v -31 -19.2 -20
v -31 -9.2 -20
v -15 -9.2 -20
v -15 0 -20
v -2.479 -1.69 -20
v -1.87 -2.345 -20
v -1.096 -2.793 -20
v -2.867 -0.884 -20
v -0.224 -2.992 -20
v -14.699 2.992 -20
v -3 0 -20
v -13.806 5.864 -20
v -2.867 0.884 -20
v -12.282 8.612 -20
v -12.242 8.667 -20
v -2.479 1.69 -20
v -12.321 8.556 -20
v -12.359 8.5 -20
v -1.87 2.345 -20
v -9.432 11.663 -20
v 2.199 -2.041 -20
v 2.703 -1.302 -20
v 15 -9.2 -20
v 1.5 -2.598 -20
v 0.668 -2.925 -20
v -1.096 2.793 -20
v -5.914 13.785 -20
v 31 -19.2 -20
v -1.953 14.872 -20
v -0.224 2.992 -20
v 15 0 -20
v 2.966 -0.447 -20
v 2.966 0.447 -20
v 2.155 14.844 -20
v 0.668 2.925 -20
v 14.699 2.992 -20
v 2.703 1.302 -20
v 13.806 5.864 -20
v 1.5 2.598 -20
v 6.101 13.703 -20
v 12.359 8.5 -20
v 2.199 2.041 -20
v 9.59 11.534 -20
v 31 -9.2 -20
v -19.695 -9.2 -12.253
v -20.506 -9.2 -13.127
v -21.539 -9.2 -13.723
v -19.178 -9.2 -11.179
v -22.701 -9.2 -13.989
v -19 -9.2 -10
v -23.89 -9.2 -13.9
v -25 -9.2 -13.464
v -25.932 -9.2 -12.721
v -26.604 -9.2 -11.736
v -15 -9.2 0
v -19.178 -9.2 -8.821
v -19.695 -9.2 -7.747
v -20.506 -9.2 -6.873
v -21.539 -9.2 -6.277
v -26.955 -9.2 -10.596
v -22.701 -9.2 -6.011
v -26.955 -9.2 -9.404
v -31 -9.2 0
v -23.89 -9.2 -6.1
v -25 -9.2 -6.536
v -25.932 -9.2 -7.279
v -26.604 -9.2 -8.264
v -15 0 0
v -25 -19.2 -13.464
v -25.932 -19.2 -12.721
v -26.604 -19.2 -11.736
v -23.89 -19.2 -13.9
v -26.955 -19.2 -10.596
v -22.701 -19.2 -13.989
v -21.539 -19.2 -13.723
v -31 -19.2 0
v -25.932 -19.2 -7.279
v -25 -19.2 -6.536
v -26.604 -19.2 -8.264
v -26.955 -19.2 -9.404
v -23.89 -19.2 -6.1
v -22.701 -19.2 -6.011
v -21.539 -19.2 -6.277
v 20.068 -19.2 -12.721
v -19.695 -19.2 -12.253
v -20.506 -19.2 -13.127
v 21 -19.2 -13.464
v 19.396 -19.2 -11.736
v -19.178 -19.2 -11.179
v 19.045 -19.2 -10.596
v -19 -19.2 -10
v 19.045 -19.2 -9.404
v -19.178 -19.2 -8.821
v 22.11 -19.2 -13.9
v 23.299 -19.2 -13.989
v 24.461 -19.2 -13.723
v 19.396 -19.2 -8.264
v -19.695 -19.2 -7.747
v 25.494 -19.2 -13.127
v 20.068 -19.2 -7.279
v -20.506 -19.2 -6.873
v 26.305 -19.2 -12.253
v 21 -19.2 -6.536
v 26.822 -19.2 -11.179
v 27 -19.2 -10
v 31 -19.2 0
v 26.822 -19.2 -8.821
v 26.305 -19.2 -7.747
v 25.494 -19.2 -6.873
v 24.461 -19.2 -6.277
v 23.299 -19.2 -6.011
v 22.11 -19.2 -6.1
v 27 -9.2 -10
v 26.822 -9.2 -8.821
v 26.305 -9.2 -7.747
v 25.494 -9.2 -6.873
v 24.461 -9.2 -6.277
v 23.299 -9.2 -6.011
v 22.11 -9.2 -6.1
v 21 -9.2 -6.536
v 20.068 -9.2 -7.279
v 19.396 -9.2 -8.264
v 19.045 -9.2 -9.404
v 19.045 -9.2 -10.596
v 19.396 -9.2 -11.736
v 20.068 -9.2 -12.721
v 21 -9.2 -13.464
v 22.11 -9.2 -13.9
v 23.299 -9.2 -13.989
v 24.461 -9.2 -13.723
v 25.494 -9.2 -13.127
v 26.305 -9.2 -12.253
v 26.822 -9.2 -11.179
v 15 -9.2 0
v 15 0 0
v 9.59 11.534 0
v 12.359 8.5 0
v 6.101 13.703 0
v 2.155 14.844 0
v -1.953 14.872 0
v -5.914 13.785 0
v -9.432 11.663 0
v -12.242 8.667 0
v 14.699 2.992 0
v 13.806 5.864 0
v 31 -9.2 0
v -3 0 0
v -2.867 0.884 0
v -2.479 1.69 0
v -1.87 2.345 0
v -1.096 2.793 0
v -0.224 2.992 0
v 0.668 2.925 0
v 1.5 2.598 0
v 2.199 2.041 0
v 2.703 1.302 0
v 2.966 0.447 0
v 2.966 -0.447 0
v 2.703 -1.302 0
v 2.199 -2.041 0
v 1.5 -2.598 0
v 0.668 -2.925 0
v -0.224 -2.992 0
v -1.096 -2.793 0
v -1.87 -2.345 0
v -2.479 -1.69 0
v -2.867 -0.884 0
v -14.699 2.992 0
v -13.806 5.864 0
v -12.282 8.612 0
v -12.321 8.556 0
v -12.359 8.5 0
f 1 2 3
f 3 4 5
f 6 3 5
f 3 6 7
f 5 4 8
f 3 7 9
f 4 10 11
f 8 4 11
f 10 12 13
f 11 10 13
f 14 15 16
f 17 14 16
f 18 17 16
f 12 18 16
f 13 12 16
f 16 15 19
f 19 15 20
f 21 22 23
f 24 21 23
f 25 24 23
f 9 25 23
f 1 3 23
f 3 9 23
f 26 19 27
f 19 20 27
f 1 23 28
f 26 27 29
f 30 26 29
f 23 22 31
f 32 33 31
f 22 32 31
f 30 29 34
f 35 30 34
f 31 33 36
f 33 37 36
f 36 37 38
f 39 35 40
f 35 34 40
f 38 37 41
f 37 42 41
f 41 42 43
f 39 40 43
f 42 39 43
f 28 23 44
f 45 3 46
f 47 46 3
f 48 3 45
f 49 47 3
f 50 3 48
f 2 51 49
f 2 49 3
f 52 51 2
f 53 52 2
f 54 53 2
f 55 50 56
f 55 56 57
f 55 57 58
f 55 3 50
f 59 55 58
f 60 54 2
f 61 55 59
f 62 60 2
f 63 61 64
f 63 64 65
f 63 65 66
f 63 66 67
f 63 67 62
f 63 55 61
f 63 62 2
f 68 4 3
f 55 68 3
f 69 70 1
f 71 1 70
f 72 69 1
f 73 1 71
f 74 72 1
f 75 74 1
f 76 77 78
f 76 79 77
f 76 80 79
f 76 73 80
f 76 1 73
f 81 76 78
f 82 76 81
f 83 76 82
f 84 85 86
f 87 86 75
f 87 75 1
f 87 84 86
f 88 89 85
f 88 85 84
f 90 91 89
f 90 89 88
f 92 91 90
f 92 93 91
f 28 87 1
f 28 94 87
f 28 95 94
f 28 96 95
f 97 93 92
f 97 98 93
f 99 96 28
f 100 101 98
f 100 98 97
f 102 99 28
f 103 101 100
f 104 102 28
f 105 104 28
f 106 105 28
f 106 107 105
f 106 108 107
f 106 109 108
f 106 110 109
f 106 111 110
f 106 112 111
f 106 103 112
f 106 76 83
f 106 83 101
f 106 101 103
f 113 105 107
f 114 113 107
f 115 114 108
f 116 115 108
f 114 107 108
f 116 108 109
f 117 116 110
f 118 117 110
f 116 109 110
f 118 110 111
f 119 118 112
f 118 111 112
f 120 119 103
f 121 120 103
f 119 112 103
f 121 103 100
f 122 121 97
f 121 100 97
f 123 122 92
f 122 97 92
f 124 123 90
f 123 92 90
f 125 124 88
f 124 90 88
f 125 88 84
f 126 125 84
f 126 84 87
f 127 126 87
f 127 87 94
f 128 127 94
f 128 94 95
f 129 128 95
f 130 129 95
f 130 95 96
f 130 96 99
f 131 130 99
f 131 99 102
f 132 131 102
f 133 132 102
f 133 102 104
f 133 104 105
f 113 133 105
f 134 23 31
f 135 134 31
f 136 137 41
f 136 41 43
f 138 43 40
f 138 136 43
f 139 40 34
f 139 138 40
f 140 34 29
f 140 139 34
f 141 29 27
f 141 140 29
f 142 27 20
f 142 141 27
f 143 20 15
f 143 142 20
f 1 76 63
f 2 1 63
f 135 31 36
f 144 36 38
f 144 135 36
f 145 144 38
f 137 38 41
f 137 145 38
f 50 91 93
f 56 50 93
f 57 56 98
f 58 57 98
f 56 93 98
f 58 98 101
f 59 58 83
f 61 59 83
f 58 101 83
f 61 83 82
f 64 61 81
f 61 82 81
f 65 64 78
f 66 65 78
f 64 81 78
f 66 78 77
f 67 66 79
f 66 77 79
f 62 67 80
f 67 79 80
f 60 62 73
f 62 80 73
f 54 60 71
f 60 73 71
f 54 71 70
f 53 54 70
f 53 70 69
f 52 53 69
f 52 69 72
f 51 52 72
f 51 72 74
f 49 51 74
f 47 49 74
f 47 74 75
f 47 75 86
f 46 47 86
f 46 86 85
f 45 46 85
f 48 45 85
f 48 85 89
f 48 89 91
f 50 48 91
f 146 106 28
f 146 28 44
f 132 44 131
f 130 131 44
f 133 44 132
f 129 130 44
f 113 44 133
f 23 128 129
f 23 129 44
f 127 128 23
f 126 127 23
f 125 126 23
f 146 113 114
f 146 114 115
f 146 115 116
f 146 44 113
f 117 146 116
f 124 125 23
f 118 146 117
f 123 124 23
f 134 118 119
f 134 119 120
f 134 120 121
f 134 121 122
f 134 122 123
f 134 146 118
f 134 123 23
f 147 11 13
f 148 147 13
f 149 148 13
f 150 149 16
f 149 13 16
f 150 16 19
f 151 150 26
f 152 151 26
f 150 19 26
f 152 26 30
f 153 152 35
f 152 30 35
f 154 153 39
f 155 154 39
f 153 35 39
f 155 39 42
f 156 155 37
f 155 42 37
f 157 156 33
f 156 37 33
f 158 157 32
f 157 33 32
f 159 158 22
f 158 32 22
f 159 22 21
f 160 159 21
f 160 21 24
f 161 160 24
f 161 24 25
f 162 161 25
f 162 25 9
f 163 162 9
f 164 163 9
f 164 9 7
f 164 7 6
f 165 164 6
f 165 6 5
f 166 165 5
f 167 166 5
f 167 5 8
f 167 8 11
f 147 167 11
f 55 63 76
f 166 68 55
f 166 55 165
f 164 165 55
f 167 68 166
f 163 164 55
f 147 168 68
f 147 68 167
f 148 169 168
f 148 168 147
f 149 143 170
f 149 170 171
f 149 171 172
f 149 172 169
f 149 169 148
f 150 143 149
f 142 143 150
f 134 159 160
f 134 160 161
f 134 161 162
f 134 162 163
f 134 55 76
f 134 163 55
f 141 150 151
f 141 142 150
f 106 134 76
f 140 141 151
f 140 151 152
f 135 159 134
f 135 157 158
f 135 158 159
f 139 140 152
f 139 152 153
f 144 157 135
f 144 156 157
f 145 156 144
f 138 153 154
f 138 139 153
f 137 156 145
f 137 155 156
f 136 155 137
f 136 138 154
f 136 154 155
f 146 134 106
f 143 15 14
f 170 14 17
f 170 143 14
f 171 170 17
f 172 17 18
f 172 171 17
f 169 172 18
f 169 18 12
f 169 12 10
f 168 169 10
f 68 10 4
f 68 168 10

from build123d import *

# Parameters (mm, degrees)
F0_W       = 3
F0_H       = 10
F1_DEPTH   = 20
F2_D       = 6
F5_D       = 8
F5_ON_F4_D = 8


with BuildPart() as f1:
    # F0 (on Top) → F1 (new body)
    with BuildSketch(Plane.XY):
        with BuildLine():
            ThreePointArc((-12.3592070943, 8.5), (-14.3245960923, 4.4503872632), (-15, 0))
            Line((-15, 0), (-9.5, 0))
            ThreePointArc((-9.5, 0), (-8.0794519161, 4.9972449146), (-4.2426406871, 8.5))
            Line((-4.2426406871, 8.5), (-12.3592070943, 8.5))
        make_face()
        with BuildLine():
            Line((4.2426406871, 8.5), (12.3592070943, 8.5))
            ThreePointArc((12.3592070943, 8.5), (0.1020002099, 14.9996531946), (-12.2424665449, 8.667295593))
            ThreePointArc((-12.2424665449, 8.667295593), (-12.301121226, 8.5838462581), (-12.3592070943, 8.5))
            Line((-12.3592070943, 8.5), (-4.2426406871, 8.5))
            ThreePointArc((-4.2426406871, 8.5), (0, 9.5), (4.2426406871, 8.5))
        make_face()
        with BuildLine():
            Line((-9.5, 0), (9.5, 0))
            ThreePointArc((9.5, 0), (8.0794519161, 4.9972449146), (4.2426406871, 8.5))
            Line((4.2426406871, 8.5), (-4.2426406871, 8.5))
            ThreePointArc((-4.2426406871, 8.5), (-8.0794519161, 4.9972449146), (-9.5, 0))
        make_face()
        with BuildLine():
            Line((-4.2426406871, 8.5), (4.2426406871, 8.5))
            ThreePointArc((4.2426406871, 8.5), (0, 9.5), (-4.2426406871, 8.5))
        make_face()
        with BuildLine():
            Line((9.5, 0), (15, 0))
            ThreePointArc((15, 0), (14.3245960923, 4.4503872632), (12.3592070943, 8.5))
            Line((12.3592070943, 8.5), (4.2426406871, 8.5))
            ThreePointArc((4.2426406871, 8.5), (8.0794519161, 4.9972449146), (9.5, 0))
        make_face()
        with BuildLine():
            ThreePointArc((-9.5, 0), (0, -9.5), (9.5, 0))
            Line((9.5, 0), (-9.5, 0))
        make_face()
        with BuildLine():
            Line((-11, -19.2), (11, -19.2))
            Line((11, -19.2), (11, -9.2))
            Line((11, -9.2), (15, -9.2))
            Line((15, -9.2), (15, 0))
            Line((15, 0), (9.5, 0))
            ThreePointArc((9.5, 0), (0, -9.5), (-9.5, 0))
            Line((-9.5, 0), (-15, 0))
            Line((-15, 0), (-15, -9.2))
            Line((-15, -9.2), (-11, -9.2))
            Line((-11, -9.2), (-11, -19.2))
        make_face()
        Polygon((-28, -19.2), (-11, -19.2), (-11, -9.2), (-15, -9.2), (-28, -9.2), align=None)
        with Locations((-29.5, -14.2)):
            Rectangle(F0_W, F0_H)
        Polygon((11, -19.2), (28, -19.2), (28, -9.2), (15, -9.2), (11, -9.2), align=None)
        with Locations((29.5, -14.2)):
            Rectangle(F0_W, F0_H)
    extrude(amount=-F1_DEPTH)

    # F2 (through all)
    with Locations(Plane.XY):
        with Locations((0, 0)):
            Hole(F2_D / 2)

    # F5 (through all)
    with Locations(Plane(origin=(0, -9.2, 0), x_dir=(-1, 0, 0), z_dir=(0, 1, 0))):
        with Locations((-23, -10)):
            Hole(F5_D / 2)

    # F5 on F4 (through all)
    with Locations(Plane(origin=(0, -9.2, 0), x_dir=(-1, 0, 0), z_dir=(0, 1, 0))):
        with Locations((23, -10)):
            Hole(F5_ON_F4_D / 2)


solid = f1.part
